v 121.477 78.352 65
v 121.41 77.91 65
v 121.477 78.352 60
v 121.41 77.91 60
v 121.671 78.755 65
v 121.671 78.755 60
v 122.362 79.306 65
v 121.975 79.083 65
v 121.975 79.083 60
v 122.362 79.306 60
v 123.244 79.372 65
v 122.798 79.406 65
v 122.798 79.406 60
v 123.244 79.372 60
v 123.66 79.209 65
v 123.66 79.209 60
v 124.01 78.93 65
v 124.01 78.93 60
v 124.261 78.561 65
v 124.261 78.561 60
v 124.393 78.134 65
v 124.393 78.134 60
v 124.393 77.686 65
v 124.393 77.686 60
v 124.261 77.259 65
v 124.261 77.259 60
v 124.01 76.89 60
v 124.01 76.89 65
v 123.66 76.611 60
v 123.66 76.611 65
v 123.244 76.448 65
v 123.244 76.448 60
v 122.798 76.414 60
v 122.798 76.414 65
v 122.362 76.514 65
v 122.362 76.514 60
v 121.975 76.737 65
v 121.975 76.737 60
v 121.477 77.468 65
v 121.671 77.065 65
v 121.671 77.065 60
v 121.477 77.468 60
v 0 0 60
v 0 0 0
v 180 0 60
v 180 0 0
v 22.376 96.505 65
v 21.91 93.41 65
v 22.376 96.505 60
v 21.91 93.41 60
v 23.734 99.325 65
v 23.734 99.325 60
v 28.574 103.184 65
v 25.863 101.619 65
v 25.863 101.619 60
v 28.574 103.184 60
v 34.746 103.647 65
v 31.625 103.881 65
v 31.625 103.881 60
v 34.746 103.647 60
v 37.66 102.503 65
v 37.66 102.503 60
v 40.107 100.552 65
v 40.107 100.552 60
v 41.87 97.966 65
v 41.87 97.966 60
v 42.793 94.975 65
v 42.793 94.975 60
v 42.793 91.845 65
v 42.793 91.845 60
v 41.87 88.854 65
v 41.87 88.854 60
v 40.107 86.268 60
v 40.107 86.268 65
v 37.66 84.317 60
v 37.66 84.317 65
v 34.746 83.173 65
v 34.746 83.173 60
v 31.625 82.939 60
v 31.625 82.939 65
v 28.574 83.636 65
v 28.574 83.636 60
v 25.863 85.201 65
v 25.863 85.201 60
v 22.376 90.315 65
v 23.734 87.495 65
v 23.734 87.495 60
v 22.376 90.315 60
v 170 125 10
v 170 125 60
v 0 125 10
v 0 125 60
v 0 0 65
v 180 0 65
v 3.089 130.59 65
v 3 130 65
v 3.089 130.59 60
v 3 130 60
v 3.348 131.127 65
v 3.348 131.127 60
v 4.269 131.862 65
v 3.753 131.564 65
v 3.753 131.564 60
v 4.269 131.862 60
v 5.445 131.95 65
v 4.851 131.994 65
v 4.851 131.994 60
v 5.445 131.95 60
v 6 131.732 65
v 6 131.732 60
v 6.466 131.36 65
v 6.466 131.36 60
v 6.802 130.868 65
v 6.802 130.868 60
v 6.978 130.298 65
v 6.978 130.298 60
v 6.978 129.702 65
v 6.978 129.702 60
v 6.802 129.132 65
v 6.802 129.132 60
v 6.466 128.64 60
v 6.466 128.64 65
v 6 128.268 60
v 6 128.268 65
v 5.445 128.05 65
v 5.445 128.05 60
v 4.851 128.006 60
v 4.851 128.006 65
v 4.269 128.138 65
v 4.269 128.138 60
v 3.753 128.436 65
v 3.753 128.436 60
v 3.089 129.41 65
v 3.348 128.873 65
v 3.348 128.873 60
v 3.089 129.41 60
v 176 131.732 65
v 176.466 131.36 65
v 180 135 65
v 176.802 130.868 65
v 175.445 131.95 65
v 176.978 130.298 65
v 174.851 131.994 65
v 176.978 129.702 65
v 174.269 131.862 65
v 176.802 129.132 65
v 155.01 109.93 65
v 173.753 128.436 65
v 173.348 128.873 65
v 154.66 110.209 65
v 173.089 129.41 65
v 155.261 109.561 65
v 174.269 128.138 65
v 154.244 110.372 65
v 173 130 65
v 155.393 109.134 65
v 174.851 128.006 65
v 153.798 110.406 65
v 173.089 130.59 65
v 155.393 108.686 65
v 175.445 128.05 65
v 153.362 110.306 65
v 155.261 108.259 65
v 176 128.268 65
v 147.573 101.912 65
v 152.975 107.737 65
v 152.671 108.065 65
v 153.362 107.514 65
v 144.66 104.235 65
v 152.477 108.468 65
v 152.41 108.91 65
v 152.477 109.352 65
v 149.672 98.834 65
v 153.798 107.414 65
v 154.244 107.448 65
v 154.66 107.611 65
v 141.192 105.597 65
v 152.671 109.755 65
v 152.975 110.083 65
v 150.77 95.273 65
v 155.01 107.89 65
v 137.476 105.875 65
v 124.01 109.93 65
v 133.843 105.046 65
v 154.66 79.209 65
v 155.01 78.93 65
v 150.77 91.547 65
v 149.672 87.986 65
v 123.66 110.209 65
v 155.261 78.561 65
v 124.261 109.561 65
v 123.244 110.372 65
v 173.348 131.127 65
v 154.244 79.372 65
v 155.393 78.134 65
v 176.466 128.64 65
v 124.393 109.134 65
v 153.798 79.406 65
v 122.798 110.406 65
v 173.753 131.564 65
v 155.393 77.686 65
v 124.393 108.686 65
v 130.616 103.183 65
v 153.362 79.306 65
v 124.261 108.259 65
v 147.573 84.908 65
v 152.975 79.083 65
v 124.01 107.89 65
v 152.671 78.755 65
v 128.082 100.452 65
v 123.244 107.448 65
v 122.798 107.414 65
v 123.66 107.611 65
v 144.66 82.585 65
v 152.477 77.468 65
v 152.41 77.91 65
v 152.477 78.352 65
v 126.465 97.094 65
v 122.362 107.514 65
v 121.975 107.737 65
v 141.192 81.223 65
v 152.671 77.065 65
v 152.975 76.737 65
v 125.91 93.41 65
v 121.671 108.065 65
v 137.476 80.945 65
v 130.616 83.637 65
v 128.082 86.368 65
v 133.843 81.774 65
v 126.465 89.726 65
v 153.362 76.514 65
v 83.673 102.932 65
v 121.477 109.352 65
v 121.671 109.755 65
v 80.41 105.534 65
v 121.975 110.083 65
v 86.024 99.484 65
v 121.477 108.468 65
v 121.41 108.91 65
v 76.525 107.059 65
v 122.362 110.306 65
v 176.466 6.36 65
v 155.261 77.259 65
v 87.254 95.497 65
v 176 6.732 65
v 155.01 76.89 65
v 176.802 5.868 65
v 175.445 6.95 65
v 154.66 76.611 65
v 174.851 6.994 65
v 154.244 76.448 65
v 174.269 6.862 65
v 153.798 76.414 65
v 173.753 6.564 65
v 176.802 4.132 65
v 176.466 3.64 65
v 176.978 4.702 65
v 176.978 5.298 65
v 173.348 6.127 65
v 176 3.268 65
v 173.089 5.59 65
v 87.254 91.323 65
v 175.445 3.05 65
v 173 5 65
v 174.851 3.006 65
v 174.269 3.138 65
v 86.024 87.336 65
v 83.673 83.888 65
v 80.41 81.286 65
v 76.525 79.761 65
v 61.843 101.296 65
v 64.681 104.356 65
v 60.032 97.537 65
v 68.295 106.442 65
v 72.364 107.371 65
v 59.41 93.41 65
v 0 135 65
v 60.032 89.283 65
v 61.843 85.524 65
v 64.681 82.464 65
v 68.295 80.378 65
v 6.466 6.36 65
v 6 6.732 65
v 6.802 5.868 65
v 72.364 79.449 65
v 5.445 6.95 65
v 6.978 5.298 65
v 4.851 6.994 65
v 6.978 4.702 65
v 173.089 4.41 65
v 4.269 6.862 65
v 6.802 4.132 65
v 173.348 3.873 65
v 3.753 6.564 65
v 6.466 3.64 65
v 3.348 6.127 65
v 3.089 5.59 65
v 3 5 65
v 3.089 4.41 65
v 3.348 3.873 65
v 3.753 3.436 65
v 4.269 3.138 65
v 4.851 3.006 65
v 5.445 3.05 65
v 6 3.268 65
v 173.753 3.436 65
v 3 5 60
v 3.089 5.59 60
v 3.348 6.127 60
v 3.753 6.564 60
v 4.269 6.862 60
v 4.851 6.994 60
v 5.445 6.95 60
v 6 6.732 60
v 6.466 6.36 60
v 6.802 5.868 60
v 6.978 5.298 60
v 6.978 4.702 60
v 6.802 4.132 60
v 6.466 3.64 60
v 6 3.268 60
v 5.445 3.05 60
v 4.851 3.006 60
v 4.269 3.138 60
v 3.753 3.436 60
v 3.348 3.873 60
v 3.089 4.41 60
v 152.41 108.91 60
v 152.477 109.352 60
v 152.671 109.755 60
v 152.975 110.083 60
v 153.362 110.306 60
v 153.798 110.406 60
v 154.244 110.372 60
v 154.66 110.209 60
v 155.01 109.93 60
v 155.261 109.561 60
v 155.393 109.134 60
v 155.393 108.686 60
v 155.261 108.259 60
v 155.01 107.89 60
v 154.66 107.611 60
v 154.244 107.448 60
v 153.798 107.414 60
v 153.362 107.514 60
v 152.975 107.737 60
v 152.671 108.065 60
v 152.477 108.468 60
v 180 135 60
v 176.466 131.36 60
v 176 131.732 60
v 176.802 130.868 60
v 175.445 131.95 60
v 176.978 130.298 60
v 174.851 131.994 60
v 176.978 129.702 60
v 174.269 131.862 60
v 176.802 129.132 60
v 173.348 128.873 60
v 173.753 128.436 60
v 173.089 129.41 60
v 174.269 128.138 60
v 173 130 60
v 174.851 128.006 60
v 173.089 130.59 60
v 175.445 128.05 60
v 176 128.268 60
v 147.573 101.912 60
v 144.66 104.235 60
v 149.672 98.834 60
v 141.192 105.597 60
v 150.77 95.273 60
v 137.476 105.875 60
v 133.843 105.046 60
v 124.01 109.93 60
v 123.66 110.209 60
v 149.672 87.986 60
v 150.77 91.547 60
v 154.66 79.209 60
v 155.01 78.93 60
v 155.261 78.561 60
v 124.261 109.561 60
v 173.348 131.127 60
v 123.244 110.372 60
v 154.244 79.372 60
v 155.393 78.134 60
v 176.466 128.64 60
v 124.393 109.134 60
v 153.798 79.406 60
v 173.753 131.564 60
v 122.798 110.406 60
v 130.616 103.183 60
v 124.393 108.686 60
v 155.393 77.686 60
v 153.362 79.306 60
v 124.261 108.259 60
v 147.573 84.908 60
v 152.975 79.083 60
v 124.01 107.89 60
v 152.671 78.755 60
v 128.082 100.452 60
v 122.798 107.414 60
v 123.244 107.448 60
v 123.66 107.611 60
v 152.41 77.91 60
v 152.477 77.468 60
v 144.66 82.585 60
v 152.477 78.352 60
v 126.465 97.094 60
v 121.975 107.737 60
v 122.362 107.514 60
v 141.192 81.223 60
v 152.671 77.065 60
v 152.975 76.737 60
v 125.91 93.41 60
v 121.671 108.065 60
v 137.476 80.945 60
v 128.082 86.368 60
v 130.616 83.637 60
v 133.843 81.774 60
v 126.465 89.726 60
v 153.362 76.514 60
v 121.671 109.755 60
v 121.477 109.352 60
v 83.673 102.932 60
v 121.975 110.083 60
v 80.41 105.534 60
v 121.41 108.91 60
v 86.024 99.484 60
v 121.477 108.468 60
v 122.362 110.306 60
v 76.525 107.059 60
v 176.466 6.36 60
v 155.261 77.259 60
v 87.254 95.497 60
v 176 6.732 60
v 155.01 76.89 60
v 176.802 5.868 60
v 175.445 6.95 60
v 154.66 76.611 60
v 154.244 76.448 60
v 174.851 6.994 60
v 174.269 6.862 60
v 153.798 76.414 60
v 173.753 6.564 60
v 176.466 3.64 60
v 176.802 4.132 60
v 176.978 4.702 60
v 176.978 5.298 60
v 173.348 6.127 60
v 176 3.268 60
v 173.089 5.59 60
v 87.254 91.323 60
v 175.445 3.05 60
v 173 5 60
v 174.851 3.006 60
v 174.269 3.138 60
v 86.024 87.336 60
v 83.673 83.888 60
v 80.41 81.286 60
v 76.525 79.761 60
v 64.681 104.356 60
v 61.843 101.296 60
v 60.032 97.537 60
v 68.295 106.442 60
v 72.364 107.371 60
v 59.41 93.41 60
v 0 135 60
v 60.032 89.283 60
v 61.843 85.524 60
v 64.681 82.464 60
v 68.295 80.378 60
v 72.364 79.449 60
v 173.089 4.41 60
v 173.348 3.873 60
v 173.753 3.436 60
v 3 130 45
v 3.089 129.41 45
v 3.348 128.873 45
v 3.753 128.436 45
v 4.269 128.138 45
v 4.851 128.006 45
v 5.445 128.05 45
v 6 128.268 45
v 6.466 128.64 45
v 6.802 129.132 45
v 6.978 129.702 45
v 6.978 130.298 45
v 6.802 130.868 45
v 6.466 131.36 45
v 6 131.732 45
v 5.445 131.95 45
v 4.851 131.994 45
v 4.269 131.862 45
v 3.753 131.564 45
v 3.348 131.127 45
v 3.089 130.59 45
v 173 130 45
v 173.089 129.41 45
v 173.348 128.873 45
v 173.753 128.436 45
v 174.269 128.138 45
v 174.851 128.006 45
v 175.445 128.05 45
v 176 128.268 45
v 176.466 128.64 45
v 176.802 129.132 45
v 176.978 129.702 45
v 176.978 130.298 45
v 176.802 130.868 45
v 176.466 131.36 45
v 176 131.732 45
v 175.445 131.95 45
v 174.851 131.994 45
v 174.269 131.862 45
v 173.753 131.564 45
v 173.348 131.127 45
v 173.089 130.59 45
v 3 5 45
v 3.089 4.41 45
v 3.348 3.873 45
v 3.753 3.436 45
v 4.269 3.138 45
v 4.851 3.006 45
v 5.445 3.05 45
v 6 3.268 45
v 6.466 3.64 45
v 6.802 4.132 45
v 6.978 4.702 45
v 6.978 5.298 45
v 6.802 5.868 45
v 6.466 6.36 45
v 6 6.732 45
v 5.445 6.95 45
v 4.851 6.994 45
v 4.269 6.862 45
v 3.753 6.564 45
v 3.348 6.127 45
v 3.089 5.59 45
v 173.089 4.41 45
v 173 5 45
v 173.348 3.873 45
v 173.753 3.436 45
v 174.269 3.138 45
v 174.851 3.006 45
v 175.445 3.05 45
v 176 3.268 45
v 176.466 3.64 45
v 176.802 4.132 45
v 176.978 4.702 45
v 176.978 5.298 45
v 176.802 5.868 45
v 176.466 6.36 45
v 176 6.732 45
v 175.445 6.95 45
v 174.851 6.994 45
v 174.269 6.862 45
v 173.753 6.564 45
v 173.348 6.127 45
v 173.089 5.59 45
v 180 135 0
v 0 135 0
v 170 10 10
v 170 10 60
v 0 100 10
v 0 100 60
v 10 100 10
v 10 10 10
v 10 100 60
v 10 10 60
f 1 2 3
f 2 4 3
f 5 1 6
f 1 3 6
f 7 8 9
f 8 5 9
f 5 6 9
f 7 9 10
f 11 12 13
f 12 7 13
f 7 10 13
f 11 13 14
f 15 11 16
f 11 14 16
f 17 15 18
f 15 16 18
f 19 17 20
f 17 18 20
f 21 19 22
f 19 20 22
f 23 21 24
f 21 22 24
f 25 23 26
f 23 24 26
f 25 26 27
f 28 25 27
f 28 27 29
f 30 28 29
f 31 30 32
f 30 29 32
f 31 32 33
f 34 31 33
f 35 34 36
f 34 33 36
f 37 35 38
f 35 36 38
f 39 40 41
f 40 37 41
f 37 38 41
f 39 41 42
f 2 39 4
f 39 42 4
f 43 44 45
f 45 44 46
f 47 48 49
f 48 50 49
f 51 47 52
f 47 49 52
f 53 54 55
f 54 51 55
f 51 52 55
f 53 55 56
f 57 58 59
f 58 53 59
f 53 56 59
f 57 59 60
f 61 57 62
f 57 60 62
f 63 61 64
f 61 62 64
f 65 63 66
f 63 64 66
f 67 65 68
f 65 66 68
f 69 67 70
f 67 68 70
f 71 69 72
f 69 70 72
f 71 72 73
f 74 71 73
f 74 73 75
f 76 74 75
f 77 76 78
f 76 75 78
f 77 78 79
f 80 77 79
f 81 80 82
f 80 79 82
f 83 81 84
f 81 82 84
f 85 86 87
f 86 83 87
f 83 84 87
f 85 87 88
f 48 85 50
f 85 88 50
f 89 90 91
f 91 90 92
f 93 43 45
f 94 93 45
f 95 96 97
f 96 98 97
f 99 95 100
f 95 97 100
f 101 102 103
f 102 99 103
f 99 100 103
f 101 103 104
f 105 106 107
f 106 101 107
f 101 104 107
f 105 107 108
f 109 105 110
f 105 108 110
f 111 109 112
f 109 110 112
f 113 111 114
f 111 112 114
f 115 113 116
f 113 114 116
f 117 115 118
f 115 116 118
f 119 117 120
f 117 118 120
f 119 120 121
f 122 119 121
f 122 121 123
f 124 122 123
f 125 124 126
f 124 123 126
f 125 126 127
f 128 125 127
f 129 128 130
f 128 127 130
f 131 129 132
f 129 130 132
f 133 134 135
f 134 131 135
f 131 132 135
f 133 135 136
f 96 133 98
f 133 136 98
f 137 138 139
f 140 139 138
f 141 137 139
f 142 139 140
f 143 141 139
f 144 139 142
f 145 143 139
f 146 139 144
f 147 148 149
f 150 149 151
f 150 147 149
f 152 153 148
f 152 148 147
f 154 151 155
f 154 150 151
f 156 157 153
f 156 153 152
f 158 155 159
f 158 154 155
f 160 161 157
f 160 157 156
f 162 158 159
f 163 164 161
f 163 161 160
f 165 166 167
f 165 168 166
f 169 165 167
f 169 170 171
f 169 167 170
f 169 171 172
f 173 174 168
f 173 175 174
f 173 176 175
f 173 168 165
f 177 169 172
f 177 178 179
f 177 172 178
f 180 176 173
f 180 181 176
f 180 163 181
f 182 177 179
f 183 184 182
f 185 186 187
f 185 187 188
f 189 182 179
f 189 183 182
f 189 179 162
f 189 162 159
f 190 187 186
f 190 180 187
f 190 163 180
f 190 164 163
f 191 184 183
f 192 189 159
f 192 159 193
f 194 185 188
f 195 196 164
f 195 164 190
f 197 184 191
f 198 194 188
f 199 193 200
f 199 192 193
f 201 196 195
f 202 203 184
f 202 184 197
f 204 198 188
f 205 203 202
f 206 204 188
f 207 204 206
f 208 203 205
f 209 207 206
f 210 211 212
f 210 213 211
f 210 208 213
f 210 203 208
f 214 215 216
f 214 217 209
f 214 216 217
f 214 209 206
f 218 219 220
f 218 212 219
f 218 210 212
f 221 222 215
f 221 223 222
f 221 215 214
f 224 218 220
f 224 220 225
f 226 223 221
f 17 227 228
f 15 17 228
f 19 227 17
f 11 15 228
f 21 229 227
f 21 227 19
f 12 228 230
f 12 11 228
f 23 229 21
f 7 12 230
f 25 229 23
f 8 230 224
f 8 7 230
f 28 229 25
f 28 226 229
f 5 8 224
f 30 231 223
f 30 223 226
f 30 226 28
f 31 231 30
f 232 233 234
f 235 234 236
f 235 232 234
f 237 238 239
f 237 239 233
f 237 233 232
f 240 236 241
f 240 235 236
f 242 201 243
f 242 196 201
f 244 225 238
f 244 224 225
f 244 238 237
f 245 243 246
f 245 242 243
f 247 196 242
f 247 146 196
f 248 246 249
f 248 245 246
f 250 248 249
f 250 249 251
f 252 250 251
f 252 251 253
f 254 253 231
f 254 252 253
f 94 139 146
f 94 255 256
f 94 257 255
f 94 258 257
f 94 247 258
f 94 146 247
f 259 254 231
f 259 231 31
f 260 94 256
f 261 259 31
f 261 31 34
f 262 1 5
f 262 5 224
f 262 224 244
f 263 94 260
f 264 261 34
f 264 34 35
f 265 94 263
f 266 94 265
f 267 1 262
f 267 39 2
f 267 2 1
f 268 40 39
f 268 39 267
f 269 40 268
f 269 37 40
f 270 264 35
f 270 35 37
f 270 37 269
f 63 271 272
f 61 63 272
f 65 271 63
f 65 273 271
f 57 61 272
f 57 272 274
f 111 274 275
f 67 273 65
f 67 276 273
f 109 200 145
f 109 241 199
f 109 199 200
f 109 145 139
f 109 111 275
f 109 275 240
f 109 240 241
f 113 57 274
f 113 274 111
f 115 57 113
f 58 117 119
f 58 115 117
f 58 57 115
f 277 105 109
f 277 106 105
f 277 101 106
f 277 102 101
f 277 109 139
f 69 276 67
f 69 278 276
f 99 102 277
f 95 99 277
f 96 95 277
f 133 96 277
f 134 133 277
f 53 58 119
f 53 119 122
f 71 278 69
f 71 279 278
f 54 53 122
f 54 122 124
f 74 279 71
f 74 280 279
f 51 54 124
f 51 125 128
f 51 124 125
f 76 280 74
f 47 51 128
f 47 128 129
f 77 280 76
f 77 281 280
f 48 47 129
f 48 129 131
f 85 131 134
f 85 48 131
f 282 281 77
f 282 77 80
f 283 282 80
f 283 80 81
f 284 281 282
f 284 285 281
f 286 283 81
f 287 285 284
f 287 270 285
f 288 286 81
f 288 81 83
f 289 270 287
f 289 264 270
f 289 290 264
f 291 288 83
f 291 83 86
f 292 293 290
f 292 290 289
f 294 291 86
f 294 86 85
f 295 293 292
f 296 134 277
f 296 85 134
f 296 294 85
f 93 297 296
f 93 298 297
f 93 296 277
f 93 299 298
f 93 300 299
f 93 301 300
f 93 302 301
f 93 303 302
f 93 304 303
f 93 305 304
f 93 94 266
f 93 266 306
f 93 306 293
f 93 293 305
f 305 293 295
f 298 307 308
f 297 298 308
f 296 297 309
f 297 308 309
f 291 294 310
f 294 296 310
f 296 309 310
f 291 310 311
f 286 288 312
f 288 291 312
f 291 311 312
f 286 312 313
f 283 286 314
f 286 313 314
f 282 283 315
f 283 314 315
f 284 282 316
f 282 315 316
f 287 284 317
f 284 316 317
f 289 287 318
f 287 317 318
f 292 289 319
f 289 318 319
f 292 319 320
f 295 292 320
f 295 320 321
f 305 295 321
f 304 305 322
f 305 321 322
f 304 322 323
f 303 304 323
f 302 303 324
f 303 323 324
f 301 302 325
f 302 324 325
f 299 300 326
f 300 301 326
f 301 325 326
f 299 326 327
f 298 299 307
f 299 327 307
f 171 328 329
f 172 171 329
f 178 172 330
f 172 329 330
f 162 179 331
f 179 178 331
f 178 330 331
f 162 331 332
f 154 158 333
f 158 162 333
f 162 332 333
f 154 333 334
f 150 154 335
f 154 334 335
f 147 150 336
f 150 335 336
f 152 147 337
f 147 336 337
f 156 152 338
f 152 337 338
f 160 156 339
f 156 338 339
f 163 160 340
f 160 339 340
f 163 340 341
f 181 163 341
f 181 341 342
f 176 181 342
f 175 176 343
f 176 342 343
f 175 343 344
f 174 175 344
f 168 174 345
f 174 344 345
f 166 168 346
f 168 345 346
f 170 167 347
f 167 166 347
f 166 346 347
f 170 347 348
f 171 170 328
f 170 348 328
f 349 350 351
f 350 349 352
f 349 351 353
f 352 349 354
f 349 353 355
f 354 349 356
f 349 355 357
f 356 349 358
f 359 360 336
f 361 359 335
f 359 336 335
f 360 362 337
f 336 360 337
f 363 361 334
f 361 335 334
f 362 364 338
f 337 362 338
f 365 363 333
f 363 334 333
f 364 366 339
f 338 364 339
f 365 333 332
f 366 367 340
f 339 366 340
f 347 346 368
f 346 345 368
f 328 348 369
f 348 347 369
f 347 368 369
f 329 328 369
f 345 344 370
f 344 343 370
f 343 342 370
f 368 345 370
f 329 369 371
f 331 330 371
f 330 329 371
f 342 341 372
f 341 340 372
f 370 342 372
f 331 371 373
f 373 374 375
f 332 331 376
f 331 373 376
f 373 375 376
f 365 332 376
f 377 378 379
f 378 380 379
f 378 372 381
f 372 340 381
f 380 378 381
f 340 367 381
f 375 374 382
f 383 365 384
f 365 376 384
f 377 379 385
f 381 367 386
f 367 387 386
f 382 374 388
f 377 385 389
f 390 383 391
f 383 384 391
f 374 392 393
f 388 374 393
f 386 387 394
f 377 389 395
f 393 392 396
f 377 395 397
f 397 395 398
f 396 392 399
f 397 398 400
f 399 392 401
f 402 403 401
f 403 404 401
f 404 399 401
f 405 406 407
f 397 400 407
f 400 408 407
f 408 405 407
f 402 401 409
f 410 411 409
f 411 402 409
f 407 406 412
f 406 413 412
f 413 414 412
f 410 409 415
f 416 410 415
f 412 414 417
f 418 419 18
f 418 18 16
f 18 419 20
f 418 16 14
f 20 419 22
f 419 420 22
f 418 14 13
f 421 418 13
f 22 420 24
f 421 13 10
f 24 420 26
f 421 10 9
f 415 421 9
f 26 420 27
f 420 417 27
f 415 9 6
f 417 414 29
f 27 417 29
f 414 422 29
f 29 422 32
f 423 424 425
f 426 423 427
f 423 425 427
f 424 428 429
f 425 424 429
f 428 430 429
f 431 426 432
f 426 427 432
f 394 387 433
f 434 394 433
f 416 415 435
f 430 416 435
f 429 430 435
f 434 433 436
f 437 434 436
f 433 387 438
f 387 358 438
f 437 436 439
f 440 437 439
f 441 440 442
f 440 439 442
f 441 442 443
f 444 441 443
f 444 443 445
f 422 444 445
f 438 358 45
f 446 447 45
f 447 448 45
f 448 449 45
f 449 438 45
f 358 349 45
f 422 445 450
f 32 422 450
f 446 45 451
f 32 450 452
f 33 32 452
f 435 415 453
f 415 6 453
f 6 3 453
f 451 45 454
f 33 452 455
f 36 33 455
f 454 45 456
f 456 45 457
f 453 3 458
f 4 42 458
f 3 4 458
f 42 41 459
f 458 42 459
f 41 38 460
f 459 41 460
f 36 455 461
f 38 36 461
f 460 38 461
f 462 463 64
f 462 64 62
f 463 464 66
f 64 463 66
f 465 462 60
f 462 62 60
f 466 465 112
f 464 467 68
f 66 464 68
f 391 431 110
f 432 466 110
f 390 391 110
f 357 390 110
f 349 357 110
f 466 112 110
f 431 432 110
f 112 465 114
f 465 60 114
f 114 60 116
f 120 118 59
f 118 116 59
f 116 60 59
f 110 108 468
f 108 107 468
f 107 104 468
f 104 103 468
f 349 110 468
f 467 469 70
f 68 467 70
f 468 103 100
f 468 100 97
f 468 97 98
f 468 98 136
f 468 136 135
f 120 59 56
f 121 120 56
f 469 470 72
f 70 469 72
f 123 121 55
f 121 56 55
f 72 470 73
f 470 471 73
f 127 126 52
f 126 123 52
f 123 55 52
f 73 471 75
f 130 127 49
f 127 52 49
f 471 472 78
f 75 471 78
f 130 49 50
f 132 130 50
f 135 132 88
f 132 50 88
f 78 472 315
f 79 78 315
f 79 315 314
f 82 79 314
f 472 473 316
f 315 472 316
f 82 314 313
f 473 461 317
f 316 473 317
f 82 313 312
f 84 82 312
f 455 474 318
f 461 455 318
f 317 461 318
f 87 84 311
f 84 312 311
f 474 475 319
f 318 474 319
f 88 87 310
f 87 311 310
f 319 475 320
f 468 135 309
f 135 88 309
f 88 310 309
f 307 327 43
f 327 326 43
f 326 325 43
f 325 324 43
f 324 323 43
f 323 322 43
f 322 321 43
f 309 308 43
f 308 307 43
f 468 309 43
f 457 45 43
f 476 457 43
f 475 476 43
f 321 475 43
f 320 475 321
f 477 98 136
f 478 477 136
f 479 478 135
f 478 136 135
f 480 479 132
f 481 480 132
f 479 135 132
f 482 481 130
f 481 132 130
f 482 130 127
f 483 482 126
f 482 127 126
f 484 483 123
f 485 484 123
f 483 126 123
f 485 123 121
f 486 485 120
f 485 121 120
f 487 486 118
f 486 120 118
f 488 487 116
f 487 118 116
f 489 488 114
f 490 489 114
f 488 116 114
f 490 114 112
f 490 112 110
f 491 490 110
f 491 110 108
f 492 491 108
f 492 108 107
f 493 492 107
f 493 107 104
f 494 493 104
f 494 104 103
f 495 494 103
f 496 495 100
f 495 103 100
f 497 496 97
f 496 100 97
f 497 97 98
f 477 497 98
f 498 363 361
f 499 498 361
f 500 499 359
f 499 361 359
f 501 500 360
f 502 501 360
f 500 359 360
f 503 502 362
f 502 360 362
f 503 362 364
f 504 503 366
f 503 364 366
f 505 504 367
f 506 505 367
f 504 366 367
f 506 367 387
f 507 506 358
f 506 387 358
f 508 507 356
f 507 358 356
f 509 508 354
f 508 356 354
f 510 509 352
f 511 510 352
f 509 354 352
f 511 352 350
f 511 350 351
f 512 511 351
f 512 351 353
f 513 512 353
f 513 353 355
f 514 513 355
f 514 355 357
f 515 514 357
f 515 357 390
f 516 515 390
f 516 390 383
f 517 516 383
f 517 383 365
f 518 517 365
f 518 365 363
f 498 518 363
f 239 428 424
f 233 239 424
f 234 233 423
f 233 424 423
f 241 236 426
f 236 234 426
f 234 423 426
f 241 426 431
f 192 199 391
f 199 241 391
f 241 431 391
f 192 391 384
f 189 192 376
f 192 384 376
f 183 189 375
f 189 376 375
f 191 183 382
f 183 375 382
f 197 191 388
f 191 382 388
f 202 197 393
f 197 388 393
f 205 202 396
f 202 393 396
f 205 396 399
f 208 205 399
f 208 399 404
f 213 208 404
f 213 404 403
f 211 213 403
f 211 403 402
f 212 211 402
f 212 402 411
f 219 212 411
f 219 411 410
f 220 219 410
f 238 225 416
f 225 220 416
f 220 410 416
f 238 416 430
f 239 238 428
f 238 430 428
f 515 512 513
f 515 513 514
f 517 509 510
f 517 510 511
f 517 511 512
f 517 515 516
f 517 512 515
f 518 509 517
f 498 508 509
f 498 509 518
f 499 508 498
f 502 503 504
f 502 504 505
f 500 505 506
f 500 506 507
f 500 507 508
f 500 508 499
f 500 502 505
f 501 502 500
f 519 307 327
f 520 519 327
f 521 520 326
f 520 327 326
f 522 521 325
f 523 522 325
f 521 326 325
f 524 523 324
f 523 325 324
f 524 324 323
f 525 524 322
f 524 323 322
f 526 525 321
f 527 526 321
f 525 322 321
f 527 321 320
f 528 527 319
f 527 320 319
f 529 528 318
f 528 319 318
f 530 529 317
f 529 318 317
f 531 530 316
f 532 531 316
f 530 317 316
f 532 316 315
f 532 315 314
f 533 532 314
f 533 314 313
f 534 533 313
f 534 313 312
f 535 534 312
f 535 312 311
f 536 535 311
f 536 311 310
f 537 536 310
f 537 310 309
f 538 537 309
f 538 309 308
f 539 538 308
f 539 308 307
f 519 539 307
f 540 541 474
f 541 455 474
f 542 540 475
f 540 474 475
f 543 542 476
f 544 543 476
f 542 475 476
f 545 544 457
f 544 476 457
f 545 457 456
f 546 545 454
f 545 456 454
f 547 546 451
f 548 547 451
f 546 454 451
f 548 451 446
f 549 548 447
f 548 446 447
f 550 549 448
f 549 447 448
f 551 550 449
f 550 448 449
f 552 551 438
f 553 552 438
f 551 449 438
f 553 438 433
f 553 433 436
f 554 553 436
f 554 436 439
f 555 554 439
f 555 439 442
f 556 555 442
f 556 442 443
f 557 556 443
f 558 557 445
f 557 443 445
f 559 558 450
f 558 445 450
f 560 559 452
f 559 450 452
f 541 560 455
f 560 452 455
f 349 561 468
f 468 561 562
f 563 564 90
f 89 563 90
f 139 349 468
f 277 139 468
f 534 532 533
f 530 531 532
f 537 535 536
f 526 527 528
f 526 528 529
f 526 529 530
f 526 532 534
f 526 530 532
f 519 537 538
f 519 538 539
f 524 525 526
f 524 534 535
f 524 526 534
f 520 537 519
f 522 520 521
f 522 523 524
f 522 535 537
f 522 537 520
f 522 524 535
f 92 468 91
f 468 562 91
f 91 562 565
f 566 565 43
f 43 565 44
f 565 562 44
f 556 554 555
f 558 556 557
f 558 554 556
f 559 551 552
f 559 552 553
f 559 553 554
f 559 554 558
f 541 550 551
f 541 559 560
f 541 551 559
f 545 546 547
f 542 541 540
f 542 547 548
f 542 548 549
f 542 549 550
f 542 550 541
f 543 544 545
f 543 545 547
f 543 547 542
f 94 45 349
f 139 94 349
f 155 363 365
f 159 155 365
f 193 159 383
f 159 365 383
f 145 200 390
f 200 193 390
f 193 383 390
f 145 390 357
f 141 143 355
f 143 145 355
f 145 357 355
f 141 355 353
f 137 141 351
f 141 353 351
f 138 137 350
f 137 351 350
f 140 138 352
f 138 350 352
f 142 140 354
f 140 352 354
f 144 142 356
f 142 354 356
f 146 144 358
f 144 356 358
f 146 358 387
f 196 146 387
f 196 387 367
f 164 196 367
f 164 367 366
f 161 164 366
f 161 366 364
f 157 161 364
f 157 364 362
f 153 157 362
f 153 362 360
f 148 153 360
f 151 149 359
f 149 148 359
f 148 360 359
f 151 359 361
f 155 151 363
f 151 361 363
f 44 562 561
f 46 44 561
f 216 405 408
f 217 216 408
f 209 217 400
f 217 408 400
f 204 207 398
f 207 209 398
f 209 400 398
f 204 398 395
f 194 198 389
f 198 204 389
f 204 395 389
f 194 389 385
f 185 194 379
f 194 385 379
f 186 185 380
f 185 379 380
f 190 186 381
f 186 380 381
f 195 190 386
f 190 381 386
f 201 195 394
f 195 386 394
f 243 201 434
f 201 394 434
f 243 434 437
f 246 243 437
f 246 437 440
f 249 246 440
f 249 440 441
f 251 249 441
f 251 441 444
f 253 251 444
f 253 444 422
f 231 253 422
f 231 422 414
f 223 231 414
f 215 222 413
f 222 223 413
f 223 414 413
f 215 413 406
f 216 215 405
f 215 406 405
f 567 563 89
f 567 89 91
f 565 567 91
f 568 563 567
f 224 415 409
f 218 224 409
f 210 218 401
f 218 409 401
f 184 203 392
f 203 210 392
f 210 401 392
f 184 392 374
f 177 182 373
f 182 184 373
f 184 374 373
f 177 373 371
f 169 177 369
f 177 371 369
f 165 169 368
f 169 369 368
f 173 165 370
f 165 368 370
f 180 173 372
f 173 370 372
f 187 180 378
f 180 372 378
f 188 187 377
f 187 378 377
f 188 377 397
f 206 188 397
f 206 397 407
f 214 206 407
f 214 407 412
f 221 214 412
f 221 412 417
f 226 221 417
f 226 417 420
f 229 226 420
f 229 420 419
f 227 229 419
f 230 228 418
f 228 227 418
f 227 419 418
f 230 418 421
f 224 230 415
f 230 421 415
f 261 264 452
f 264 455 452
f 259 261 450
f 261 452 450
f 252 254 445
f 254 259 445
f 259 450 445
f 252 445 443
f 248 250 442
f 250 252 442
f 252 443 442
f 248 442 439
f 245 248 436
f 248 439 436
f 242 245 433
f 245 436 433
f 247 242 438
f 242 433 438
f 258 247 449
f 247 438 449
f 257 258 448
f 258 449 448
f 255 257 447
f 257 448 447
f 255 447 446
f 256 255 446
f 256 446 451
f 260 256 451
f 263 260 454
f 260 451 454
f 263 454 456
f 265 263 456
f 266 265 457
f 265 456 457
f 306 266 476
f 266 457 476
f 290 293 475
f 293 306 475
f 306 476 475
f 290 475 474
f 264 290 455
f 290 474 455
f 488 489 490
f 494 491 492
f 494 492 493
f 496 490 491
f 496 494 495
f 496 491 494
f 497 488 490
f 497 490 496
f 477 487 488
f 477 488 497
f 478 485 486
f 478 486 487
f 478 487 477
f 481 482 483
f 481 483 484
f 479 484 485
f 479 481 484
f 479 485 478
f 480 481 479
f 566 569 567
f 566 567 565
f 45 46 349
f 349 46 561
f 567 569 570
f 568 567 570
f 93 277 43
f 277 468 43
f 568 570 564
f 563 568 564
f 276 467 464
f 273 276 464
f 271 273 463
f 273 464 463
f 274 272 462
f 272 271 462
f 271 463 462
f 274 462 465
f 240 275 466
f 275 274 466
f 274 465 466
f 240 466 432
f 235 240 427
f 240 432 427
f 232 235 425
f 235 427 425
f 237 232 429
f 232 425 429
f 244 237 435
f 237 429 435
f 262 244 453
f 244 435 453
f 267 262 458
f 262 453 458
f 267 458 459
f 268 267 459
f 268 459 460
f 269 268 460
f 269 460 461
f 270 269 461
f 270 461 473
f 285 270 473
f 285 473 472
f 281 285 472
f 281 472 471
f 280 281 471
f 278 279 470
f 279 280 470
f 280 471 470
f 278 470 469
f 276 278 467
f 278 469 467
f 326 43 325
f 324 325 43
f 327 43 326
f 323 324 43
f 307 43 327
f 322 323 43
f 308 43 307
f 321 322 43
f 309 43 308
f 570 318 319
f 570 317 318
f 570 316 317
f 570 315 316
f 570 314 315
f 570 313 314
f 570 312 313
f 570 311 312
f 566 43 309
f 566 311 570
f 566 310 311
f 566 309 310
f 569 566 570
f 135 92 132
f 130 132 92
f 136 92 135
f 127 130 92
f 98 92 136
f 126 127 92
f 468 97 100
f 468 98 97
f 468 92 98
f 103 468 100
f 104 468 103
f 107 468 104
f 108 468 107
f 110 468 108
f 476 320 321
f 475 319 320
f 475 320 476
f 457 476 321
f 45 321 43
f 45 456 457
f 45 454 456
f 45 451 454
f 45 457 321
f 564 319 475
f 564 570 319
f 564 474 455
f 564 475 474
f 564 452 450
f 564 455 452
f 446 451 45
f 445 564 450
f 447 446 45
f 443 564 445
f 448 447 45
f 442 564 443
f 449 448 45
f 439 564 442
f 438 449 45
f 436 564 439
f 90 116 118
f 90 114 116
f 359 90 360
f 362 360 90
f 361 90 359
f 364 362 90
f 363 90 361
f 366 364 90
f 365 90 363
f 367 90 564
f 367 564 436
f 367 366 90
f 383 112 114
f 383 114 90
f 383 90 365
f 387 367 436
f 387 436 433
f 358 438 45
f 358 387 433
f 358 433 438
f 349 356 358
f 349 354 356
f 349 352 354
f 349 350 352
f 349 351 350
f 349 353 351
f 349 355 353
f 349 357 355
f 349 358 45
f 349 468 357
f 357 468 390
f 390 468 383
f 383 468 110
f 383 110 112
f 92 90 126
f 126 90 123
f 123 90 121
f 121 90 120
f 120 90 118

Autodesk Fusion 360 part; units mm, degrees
sketch "Sketch1" plane through (0, 0, 0) normal (0, 0, 1) x (1, 0, 0)
  line L0 (0, 0) -> (180, 0)
  line L1 (180, 0) -> (180, 135)
  line L2 (180, 135) -> (0, 135)
  line L3 (0, 135) -> (0, 0)
  dimension "d1" = 180
  dimension "d2" = 135
extrude "Extrude1" add sketch "Sketch1" along normal blind 60 makes body 1
sketch "Sketch2" plane through (0, 0, 60) normal (0, 0, 1) x (-1, 0, 0)
  line L0 (0, -135) -> (0, 0)
  line L1 (0, 0) -> (-180, 0)
  line L2 (-180, 0) -> (-180, -135)
  line L3 (-180, -135) -> (0, -135)
  line L4 (-10, -10) -> (-170, -10)
  line L5 (-170, -10) -> (-170, -125)
  line L6 (-170, -125) -> (-10, -125)
  line L7 (-10, -125) -> (0, -125)
  line L8 (-10, -100) -> (0, -100)
  line L9 (0, -100) -> (0, -125)
  line L10 (-10, -100) -> (-10, -10)
  dimension "d5" = 160
  dimension "d6" = 115
extrude "Extrude2" cut sketch "Sketch2" against normal blind 50 contours L0 L4 L5 L6 L7 L8 L9 L10 bodies 1
sketch "Sketch3" plane through (0, 0, 60) normal (0, 0, 1) x (-1, 0, 0)
  line L0 (-10, -100) -> (0, -100)
  line L1 (0, -100) -> (0, 0)
  line L2 (0, 0) -> (-180, 0)
  line L3 (-180, 0) -> (-180, -135)
  line L4 (-180, -135) -> (0, -135)
  line L5 (0, -135) -> (0, -125)
  line L6 (0, -125) -> (-170, -125)
  line L7 (-170, -125) -> (-170, -10)
  line L8 (-170, -10) -> (-10, -10)
  line L9 (-10, -10) -> (-10, -100)
  circle A0 centre (-5, -5) radius 2
  circle A1 centre (-175, -5) radius 2
  circle A2 centre (-175, -130) radius 2
  circle A3 centre (-5, -130) radius 2
  dimension "d9" = 4
  dimension "d10" = 4
  dimension "d11" = 4
  dimension "d12" = 4
extrude "Extrude3" cut sketch "Sketch3" against normal blind 15 contours A0 | A1 | A2 | A3 bodies 1
sketch "Sketch4" plane through (0, 0, 60) normal (0, 0, 1) x (-1, 0, 0)
  circle A0 centre (-5, -5) radius 2
  circle A1 centre (-5, -130) radius 2
  circle A2 centre (-175, -5) radius 2
  circle A3 centre (-175, -130) radius 2
  line L0 (-10, -100) -> (0, -100)
  line L1 (0, -100) -> (0, 0)
  line L2 (0, 0) -> (-180, 0)
  line L3 (-180, 0) -> (-180, -135)
  line L4 (-180, -135) -> (0, -135)
  line L5 (0, -135) -> (0, -125)
  line L6 (0, -125) -> (-170, -125)
  line L7 (-170, -125) -> (-170, -10)
  line L8 (-170, -10) -> (-10, -10)
  line L9 (-10, -10) -> (-10, -100)
  line L10 (0, 0) -> (-180, 0)
  line L11 (-180, 0) -> (-180, -135)
  line L12 (-180, -135) -> (0, -135)
  line L13 (0, -135) -> (0, 0)
  line L14 (-116.82, -115) -> (-116.82, -108.91) construction
  line L15 (-116.82, -108.91) -> (-122.91, -108.91) construction
  circle A4 centre (-122.91, -108.91) radius 1.5
  line L16 (-122.91, -108.91) -> (-153.91, -108.91) construction
  circle A5 centre (-153.91, -108.91) radius 1.5
  line L17 (-153.91, -108.91) -> (-153.91, -77.91) construction
  circle A6 centre (-153.91, -77.91) radius 1.5
  line L18 (-122.91, -108.91) -> (-122.91, -77.91) construction
  circle A7 centre (-122.91, -77.91) radius 1.5
  line L19 (-116.82, -115) -> (-160, -71.82) construction
  line L20 (-116.82, -71.82) -> (-160, -115) construction
  circle A8 centre (-138.41, -93.41) radius 12.5
  line L21 (-138.41, -93.41) -> (-73.41, -93.41) construction
  line L22 (-73.41, -93.41) -> (-32.41, -93.41) construction
  circle A9 centre (-73.41, -93.41) radius 14
  circle A10 centre (-32.41, -93.41) radius 10.5
  dimension "d15" = 43.18
  dimension "d16" = 43.18
  dimension "d17" = 6.09
  dimension "d18" = 6.09
  dimension "d19" = 3
  dimension "d20" = 31
  dimension "d21" = 3
  dimension "d22" = 31
  dimension "d23" = 3
  dimension "d24" = 31
  dimension "d25" = 3
  dimension "d26" = 25
  dimension "d27" = 65
  dimension "d28" = 41
  dimension "d29" = 28
  dimension "d30" = 21
extrude "Extrude4" add sketch "Sketch4" along normal blind 5 separate body makes body 2
